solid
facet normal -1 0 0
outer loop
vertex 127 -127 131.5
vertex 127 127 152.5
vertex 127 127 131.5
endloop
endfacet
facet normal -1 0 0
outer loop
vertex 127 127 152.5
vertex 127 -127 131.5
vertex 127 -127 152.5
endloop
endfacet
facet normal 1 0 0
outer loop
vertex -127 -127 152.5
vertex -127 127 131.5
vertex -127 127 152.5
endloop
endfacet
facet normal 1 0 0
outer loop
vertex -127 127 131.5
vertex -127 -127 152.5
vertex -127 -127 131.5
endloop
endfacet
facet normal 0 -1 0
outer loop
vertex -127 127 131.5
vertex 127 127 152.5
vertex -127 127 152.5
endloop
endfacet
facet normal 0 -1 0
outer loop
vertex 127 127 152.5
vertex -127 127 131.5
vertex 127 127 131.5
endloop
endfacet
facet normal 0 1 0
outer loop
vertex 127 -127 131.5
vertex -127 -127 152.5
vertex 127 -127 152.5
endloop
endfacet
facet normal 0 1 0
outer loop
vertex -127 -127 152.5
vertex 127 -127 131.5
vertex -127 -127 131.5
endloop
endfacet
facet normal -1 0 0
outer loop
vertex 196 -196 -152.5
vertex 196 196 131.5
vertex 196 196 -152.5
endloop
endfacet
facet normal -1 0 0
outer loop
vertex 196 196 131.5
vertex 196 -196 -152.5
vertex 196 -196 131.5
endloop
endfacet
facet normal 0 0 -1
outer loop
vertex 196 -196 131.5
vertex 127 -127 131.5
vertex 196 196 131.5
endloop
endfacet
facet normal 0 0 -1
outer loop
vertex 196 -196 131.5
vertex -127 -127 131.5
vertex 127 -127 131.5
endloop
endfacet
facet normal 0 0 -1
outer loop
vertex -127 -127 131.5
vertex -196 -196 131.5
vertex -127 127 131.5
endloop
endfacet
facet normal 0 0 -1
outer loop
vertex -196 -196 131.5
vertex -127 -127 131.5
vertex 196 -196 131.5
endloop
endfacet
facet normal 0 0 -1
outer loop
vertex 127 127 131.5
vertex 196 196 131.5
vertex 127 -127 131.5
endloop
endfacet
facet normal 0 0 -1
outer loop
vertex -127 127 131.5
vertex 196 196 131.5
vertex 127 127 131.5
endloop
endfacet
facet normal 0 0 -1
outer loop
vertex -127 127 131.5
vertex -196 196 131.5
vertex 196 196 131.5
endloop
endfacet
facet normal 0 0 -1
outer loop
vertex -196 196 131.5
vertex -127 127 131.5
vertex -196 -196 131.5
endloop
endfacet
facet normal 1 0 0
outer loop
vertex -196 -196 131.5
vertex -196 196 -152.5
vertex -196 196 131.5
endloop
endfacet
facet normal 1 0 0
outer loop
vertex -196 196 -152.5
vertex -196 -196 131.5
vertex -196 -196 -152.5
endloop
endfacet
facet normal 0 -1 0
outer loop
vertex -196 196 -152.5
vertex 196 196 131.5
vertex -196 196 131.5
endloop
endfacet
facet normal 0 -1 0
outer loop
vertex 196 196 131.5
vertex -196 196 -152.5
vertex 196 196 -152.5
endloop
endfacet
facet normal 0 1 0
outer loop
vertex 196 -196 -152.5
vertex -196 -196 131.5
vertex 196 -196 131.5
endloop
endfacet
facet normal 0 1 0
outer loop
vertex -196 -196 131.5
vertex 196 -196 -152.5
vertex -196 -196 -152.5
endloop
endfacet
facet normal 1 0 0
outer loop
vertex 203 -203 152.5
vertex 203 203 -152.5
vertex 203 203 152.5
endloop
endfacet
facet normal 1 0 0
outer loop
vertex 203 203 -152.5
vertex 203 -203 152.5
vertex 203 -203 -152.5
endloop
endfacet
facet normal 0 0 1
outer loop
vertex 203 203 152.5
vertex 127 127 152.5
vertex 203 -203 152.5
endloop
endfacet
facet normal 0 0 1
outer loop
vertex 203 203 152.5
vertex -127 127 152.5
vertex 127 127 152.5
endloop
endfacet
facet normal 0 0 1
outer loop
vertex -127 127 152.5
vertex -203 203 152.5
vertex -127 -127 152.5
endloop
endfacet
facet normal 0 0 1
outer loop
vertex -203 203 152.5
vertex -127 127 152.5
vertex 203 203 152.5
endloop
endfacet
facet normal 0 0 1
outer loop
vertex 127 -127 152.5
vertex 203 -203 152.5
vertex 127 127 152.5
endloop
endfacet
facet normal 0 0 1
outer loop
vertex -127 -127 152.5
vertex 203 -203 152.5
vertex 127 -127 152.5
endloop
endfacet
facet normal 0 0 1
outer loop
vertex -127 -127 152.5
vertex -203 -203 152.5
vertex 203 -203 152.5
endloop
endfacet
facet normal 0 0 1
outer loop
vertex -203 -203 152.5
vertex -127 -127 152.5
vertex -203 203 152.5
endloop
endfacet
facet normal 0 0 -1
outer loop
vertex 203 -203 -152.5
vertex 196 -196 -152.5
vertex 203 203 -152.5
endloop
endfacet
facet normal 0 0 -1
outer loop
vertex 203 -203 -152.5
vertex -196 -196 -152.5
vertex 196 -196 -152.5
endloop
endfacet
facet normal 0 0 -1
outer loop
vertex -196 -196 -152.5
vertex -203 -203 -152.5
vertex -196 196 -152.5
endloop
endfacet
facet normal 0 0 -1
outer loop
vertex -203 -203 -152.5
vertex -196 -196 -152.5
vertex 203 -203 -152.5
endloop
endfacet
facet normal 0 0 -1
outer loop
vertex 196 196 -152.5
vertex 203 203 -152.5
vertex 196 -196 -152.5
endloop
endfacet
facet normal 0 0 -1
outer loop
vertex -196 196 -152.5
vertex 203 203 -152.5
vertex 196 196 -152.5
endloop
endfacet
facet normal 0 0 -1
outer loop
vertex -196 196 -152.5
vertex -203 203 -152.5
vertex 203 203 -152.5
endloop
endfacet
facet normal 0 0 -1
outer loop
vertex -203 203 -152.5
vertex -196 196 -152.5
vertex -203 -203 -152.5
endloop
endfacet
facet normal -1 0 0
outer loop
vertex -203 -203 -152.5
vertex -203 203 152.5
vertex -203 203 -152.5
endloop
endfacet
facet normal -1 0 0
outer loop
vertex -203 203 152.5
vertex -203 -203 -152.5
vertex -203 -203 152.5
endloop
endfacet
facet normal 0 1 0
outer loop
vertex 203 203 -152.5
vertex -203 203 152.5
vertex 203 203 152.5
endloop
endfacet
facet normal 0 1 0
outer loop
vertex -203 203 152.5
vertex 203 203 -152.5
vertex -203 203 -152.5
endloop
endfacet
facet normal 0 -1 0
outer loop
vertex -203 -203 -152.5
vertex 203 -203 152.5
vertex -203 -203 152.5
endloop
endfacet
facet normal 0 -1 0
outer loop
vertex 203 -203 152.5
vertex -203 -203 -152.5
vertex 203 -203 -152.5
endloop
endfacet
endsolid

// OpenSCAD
wallThickness=14;
roofThickness=14;
cubeHeight=305;
cubeWidth=406;
cubeLength=406;
aperatureWidth=254;
aperatureLength=254; 

difference () {
  translate([0,0,0])
	cube ([cubeWidth,cubeLength,cubeHeight],center = true);
  union () {
    translate([0,0,roofThickness])
    cube ([aperatureWidth,aperatureLength,cubeHeight],center = true);
    translate([0,0,-roofThickness])
		cube ([cubeWidth-wallThickness,cubeLength-wallThickness,cubeHeight-roofThickness],center = true);
  }
}
